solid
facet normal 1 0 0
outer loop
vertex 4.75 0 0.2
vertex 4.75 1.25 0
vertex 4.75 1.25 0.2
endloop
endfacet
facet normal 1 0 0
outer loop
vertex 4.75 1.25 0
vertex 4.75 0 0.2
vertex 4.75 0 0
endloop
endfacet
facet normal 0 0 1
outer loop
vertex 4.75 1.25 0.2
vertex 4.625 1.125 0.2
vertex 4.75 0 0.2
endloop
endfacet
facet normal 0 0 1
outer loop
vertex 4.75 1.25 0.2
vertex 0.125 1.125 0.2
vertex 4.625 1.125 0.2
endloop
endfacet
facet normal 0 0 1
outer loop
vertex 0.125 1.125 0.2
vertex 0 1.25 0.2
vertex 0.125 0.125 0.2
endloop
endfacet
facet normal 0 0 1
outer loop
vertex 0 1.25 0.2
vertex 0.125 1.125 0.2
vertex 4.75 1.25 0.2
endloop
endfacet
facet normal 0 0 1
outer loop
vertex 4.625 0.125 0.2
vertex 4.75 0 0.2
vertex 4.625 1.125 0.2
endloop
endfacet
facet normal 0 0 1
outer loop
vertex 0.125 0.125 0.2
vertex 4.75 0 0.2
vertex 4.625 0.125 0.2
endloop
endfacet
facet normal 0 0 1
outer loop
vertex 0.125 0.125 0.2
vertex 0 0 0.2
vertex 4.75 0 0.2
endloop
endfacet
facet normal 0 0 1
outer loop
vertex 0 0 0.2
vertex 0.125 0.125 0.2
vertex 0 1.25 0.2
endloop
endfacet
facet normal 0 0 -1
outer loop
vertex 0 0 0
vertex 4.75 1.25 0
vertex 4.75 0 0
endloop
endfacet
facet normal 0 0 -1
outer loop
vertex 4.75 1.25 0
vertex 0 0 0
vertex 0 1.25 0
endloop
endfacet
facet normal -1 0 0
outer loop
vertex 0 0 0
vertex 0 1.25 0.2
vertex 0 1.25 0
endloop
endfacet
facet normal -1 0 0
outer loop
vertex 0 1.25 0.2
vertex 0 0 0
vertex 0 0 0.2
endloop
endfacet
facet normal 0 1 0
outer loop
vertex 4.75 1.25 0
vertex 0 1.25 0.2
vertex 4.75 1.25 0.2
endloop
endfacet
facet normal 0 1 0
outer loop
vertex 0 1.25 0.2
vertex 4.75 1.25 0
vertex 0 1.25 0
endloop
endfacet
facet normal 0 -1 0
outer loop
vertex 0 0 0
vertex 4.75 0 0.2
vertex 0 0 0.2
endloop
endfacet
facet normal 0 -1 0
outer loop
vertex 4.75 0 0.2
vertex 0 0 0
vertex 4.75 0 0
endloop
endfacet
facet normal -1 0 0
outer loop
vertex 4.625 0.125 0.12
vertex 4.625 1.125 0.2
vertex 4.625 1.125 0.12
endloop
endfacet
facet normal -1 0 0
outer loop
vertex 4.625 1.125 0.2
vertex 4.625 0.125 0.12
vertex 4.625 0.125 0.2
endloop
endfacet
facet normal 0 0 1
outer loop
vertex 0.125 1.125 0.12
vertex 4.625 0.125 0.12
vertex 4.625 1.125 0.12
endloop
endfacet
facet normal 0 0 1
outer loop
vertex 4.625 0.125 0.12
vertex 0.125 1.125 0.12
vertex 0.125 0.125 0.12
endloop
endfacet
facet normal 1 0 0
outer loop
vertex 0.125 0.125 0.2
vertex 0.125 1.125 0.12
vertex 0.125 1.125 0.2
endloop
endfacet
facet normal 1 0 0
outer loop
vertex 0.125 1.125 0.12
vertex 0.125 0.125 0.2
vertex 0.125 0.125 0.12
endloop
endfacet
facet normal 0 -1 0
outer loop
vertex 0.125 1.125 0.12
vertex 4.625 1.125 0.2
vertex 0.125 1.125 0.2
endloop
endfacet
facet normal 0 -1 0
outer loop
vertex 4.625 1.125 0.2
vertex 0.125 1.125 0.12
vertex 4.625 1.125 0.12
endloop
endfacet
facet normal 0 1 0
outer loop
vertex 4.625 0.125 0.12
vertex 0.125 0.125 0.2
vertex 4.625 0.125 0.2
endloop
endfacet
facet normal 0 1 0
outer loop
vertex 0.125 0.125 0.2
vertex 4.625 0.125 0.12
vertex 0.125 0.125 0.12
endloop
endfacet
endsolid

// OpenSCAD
scale([1,1,0.4]) difference(){
	cube([4.75,1.25,0.5]);
	translate([0.25/2,0.25/2,0.3]) cube([4.5,1,0.201]);
	#translate([0.2,0.1,0.1]) linear_extrude(height = 0.2, convexity = 10) import(file = "durchsuchung.dxf");
}
